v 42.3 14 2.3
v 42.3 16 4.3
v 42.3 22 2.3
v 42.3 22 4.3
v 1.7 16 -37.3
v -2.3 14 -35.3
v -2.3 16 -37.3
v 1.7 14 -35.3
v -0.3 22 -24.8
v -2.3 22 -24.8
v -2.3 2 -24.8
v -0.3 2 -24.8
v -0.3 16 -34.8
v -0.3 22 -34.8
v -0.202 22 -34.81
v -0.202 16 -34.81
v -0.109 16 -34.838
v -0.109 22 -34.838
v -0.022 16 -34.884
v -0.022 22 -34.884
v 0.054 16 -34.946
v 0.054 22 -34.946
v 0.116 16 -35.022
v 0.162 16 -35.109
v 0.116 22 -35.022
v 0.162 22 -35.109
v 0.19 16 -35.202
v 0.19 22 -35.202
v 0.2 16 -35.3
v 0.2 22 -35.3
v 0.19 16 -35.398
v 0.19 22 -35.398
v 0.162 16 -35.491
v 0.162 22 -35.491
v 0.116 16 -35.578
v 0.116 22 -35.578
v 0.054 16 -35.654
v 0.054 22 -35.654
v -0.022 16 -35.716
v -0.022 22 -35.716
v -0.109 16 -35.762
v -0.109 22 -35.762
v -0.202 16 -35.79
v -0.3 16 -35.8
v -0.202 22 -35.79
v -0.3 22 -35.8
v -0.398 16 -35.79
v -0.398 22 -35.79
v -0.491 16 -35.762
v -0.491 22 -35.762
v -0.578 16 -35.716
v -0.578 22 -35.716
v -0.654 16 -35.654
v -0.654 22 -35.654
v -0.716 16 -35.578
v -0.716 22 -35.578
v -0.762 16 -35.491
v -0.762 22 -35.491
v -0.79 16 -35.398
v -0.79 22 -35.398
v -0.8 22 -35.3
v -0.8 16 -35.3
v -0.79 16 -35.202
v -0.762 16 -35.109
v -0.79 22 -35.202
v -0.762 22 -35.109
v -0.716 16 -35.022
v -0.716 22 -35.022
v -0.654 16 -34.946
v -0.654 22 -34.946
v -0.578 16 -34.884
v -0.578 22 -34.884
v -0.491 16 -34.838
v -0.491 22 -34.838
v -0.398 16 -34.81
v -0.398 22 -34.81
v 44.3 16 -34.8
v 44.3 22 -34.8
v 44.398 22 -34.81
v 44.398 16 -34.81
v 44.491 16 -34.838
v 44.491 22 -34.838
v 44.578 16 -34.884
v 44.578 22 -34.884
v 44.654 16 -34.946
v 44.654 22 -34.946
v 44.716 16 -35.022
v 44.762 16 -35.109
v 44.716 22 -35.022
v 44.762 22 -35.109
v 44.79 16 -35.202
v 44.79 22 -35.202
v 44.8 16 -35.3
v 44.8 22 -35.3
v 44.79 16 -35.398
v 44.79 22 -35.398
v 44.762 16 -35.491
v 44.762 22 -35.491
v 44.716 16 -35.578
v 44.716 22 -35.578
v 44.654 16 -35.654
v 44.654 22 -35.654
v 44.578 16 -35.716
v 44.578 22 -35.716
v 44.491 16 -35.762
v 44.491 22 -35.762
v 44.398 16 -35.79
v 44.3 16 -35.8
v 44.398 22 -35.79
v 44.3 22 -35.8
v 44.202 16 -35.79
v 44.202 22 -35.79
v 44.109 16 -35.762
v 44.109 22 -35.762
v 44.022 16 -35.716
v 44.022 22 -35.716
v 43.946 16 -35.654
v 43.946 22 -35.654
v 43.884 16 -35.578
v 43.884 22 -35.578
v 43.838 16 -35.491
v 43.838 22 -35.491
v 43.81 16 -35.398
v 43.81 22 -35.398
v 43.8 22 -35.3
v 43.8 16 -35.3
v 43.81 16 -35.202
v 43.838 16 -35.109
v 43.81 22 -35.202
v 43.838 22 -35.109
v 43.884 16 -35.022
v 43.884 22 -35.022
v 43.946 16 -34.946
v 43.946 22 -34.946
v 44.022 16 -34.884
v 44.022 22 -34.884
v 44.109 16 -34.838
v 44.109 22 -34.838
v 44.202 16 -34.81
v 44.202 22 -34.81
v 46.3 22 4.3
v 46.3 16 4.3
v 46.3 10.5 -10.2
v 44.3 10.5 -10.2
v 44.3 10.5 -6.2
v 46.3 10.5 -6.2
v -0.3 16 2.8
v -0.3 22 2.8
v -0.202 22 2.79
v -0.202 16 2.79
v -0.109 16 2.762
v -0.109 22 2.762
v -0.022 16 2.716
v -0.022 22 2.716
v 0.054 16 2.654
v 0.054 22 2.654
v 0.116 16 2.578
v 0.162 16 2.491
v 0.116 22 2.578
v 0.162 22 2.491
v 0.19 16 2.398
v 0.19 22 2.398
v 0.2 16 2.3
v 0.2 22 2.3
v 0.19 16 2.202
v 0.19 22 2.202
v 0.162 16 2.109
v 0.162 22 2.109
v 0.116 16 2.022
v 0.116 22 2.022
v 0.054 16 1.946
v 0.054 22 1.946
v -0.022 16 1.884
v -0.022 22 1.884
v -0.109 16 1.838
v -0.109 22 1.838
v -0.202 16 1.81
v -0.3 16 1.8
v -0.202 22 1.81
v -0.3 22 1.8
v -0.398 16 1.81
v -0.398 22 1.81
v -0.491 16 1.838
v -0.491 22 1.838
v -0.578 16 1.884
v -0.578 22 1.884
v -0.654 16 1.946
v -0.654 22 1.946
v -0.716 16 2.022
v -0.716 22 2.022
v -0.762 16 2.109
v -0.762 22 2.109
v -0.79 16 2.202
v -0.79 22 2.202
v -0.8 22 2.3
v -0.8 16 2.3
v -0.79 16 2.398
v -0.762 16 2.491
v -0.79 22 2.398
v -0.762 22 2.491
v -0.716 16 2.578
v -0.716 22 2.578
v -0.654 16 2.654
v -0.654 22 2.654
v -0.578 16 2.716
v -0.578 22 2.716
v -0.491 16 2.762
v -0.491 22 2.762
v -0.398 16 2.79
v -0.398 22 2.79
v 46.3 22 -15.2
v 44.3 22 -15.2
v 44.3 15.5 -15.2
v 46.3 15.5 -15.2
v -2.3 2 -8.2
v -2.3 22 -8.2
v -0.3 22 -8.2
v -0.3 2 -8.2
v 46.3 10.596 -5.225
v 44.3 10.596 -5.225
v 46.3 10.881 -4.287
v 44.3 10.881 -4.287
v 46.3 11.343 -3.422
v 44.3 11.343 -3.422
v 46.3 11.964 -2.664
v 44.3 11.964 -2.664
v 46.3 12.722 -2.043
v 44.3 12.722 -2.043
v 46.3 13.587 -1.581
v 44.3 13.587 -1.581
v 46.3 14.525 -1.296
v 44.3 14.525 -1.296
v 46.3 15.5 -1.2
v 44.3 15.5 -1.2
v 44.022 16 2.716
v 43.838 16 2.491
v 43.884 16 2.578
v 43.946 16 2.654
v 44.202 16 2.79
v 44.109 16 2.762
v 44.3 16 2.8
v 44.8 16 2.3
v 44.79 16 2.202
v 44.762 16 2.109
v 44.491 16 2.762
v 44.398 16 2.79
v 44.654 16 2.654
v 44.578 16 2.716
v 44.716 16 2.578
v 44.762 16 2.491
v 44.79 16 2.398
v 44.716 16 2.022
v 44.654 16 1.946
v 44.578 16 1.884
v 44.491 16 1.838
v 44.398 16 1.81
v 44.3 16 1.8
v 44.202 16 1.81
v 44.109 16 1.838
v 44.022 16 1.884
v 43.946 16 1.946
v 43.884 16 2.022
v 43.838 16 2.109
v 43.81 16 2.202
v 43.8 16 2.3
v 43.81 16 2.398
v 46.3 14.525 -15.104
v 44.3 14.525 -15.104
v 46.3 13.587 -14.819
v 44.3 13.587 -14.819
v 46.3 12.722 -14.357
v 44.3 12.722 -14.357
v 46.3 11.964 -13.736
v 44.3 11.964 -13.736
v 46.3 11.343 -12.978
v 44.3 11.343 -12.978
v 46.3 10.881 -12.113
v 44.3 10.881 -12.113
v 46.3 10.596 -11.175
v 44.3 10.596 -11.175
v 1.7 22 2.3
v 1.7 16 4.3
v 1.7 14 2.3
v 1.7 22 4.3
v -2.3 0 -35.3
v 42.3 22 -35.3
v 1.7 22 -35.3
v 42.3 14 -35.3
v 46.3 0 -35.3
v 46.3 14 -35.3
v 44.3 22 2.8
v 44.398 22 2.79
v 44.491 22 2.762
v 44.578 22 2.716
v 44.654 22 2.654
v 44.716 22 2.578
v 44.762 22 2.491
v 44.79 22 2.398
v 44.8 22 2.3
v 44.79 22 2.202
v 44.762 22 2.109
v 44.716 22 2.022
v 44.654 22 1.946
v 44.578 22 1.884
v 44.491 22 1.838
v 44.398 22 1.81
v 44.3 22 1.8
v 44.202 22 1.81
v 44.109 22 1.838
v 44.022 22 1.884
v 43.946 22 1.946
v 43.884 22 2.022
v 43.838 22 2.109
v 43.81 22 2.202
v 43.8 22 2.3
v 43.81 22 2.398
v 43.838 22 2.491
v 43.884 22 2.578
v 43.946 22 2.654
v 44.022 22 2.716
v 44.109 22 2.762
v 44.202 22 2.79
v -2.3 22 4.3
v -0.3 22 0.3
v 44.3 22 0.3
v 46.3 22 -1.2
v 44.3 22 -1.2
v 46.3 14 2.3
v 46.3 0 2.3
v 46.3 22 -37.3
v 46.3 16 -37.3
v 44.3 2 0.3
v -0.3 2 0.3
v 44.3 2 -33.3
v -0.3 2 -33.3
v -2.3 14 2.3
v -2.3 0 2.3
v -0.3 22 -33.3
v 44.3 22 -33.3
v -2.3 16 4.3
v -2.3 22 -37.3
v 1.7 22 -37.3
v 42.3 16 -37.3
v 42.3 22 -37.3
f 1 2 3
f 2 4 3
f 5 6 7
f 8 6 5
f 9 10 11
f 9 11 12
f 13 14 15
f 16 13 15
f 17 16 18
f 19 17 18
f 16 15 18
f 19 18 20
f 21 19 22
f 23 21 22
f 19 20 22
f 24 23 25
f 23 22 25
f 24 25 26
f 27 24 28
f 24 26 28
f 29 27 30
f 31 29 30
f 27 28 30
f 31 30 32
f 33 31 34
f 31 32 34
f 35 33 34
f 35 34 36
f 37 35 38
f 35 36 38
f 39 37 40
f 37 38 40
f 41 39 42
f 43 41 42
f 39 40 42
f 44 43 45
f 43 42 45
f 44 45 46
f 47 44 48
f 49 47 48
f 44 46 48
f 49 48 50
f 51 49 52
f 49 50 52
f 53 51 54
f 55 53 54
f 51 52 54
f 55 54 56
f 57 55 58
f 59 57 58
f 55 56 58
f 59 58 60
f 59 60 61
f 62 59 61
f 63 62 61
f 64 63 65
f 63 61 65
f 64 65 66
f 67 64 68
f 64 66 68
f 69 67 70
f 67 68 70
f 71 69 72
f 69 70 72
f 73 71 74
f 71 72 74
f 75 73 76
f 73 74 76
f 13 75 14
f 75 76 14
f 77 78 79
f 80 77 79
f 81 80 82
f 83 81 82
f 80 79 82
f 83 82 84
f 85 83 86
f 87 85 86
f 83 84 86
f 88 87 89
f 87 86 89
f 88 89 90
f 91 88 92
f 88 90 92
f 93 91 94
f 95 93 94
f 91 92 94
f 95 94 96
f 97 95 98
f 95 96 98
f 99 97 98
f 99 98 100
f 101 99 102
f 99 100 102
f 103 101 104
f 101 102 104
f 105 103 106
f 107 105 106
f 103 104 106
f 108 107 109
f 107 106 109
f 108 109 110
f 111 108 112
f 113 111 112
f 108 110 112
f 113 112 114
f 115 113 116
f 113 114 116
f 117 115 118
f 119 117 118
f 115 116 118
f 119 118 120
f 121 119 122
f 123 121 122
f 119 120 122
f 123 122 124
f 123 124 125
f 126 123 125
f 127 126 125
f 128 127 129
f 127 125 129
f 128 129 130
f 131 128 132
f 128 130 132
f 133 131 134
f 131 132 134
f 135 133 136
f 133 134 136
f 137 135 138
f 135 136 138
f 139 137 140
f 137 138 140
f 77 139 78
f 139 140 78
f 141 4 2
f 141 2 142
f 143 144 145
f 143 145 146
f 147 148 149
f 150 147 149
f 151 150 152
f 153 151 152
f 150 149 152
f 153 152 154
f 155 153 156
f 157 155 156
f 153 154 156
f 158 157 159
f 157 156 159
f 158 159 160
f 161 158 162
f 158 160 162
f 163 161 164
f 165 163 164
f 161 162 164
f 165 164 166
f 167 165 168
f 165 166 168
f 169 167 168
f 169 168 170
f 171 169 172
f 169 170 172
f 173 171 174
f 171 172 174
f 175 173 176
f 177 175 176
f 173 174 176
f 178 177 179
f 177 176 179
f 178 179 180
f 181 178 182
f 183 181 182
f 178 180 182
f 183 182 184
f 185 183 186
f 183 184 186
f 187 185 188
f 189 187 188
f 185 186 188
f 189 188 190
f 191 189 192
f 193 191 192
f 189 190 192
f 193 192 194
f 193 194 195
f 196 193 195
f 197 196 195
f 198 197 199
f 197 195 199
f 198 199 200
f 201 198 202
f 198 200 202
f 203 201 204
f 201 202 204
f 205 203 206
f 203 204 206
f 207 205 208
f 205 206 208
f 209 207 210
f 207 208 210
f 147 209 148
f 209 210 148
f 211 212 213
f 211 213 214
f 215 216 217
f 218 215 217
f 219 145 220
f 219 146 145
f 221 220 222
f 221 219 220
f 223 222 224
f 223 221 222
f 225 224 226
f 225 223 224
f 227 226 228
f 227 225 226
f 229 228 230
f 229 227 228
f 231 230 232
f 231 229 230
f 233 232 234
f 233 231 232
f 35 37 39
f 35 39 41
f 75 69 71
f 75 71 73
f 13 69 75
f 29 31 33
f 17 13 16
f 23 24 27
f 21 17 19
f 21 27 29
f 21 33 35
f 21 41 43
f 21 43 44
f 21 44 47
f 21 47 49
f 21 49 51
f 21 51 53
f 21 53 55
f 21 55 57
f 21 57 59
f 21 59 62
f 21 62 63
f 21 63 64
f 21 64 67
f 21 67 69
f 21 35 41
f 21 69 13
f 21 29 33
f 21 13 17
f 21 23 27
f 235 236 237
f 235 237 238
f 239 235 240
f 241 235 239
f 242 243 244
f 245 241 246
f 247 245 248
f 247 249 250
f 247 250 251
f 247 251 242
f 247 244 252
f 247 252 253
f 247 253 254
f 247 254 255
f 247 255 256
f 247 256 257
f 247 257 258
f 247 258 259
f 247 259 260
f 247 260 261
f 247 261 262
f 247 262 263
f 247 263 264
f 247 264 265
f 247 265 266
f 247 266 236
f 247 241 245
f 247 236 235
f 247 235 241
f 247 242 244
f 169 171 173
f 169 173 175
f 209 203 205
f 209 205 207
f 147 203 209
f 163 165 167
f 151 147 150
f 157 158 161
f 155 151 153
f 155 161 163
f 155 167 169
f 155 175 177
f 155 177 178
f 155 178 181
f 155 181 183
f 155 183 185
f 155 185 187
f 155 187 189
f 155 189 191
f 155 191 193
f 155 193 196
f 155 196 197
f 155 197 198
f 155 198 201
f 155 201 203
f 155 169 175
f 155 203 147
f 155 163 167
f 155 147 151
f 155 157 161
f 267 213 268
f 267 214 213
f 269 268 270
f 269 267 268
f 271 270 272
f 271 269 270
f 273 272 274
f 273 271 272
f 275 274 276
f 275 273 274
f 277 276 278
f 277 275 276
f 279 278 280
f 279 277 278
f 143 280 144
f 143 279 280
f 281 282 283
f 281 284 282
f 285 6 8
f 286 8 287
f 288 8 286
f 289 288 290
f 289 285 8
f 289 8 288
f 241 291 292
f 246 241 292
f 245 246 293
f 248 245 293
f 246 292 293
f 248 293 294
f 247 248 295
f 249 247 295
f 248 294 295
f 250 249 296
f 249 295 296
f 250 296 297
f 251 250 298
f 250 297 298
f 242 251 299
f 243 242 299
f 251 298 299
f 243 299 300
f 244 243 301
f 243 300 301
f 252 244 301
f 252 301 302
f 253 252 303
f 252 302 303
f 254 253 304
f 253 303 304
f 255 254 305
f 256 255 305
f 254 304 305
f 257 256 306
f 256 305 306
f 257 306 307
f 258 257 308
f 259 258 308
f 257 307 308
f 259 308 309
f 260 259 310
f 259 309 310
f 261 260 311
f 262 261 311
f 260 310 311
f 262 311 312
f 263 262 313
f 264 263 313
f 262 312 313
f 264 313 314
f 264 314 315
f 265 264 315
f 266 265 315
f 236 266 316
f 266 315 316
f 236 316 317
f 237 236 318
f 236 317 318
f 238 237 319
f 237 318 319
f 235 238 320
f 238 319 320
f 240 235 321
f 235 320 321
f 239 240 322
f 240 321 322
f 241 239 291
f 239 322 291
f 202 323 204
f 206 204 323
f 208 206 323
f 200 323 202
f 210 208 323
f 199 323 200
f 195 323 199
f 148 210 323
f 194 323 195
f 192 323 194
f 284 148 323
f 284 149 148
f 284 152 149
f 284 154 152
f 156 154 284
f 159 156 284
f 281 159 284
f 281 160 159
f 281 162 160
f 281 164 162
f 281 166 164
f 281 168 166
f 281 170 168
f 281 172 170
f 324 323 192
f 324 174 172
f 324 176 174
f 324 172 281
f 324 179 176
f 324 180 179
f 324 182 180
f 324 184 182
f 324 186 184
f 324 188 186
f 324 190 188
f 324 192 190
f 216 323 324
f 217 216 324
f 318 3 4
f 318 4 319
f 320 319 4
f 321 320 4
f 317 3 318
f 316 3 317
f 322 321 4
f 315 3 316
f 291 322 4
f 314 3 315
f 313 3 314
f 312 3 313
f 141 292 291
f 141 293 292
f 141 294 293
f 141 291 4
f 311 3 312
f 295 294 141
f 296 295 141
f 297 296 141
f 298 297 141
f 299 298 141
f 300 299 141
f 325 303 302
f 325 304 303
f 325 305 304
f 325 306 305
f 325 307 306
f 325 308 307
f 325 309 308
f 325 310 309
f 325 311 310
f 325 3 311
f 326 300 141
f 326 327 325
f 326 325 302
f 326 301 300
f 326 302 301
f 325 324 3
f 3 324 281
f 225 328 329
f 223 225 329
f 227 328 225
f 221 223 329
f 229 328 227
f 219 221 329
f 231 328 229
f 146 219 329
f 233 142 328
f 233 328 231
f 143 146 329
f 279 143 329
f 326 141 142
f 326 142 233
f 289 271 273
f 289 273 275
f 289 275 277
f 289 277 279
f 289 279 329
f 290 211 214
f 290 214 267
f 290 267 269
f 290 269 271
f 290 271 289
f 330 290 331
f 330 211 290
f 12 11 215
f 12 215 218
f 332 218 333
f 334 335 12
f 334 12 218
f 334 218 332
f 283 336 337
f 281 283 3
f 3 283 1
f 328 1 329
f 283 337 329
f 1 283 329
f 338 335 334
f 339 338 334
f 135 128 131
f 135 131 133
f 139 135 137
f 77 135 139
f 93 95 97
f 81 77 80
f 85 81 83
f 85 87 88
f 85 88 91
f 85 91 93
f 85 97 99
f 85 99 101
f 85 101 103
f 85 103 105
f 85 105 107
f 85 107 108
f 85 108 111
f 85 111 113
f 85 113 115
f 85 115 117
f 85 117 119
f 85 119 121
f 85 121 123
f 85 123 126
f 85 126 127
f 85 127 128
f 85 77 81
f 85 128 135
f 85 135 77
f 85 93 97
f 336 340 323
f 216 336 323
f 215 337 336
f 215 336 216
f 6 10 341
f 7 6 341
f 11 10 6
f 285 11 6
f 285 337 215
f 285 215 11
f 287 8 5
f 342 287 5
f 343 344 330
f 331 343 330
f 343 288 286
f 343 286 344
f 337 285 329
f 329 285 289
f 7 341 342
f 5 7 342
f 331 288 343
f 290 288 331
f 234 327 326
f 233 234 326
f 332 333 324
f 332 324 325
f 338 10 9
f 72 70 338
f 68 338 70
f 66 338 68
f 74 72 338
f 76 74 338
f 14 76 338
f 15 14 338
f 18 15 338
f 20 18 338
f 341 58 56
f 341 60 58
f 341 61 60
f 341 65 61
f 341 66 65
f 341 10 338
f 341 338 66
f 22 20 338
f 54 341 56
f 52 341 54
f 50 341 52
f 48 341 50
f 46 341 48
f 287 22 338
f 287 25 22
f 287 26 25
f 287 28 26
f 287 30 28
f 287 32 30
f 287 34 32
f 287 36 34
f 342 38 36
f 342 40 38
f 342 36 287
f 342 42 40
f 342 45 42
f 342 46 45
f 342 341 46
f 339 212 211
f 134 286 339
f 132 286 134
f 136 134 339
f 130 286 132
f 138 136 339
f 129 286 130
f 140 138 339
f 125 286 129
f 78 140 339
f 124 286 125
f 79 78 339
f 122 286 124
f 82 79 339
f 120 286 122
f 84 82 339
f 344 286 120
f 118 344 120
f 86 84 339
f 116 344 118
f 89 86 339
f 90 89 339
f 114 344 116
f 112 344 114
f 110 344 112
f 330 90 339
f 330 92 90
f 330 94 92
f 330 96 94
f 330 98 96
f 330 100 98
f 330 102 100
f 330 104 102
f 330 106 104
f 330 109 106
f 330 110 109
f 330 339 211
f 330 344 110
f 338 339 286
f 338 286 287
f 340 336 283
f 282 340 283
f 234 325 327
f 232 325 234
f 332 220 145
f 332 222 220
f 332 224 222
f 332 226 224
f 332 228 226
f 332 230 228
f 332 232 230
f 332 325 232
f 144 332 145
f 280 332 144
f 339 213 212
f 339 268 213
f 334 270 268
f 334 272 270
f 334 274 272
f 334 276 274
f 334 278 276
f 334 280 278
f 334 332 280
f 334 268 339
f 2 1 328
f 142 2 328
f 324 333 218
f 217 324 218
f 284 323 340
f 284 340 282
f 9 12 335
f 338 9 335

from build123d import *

# Parameters (mm, degrees)
SKETCH1_W           = 48.6
SKETCH1_H           = 37.6
SKETCH1_W_2         = 44.6
SKETCH1_H_2         = 33.6
SKETCH1_W_3         = 44
SKETCH1_H_3         = 33
BOSS_EXTRUDE1_DEPTH = 2
SKETCH1_3_W         = 48.6
SKETCH1_3_H         = 37.6
SKETCH1_3_W_2       = 44.6
SKETCH1_3_H_2       = 33.6
BOSS_EXTRUDE2_DEPTH = 22
SKETCH2_W           = 2
SKETCH2_H           = 16.6
CUT_EXTRUDE1_DEPTH  = 20
SKETCH3_W           = 2
SKETCH3_H           = 14
CUT_EXTRUDE2_DEPTH  = 11.5
FILLET1_R           = 5
SKETCH4_W           = 4
SKETCH4_H           = 2
BOSS_EXTRUDE3_DEPTH = 6
CHAMFER1_SIZE       = 2
SKETCH5_R           = 0.5
CUT_EXTRUDE4_DEPTH  = 6


with BuildPart() as part:
    # Sketch1 → Boss-Extrude1 (new body)
    # profile 1 of 3: a face of its own
    with BuildSketch(Plane(origin=(0, 0, 0), x_dir=(1, 0, 0), z_dir=(0, 1, 0))):
        with Locations((22, 16.5)):
            Rectangle(SKETCH1_W, SKETCH1_H)
        with Locations((22, 16.5)):
            Rectangle(SKETCH1_W_2, SKETCH1_H_2, mode=Mode.SUBTRACT)
    # profile 2 of 3: a face of its own
    with BuildSketch(Plane(origin=(0, 0, 0), x_dir=(1, 0, 0), z_dir=(0, 1, 0))):
        with Locations((22, 16.5)):
            Rectangle(SKETCH1_W_2, SKETCH1_H_2)
        with Locations((22, 16.5)):
            Rectangle(SKETCH1_W_3, SKETCH1_H_3, mode=Mode.SUBTRACT)
    # profile 3 of 3: a face of its own
    with BuildSketch(Plane(origin=(0, 0, 0), x_dir=(1, 0, 0), z_dir=(0, 1, 0))):
        with Locations((22, 16.5)):
            Rectangle(SKETCH1_W_3, SKETCH1_H_3)
    extrude(amount=BOSS_EXTRUDE1_DEPTH)

    # Sketch1<3> → Boss-Extrude2 (add)
    with BuildSketch(Plane(origin=(0, 0, 0), x_dir=(1, 0, 0), z_dir=(0, 1, 0))):
        with Locations((22, 16.5)):
            Rectangle(SKETCH1_3_W, SKETCH1_3_H)
        with Locations((22, 16.5)):
            Rectangle(SKETCH1_3_W_2, SKETCH1_3_H_2, mode=Mode.SUBTRACT)
    extrude(amount=BOSS_EXTRUDE2_DEPTH)

    # Sketch2 → Cut-Extrude1 (cut)
    with BuildSketch(Plane(origin=(0, 22, 0), x_dir=(1, 0, 0), z_dir=(0, 1, 0))):
        with Locations((-1.3, 16.5)):
            Rectangle(SKETCH2_W, SKETCH2_H)
    extrude(amount=-CUT_EXTRUDE1_DEPTH, mode=Mode.SUBTRACT)

    # Sketch3 → Cut-Extrude2 (cut)
    with BuildSketch(Plane(origin=(0, 22, 0), x_dir=(1, 0, 0), z_dir=(0, 1, 0))):
        with Locations((45.3, 8.2)):
            Rectangle(SKETCH3_W, SKETCH3_H)
    extrude(amount=-CUT_EXTRUDE2_DEPTH, mode=Mode.SUBTRACT)

    # Fillet1
    fillet1_edges = [part.edges().sort_by_distance(p)[0] for p in [
        (45.3, 10.5, -15.2),
        (45.3, 10.5, -1.2),
    ]]
    fillet(fillet1_edges, radius=FILLET1_R)

    # Sketch4 → Boss-Extrude3 (add)
    with BuildSketch(Plane(origin=(0, 22, 0), x_dir=(1, 0, 0), z_dir=(0, 1, 0))):
        with Locations((44.3, -3.3)):
            Rectangle(SKETCH4_W, SKETCH4_H)
        with Locations((-0.3, -3.3)):
            Rectangle(SKETCH4_W, SKETCH4_H)
        with Locations((-0.3, 36.3)):
            Rectangle(SKETCH4_W, SKETCH4_H)
        with Locations((44.3, 36.3)):
            Rectangle(SKETCH4_W, SKETCH4_H)
    extrude(amount=-BOSS_EXTRUDE3_DEPTH)

    # Chamfer1
    chamfer1_edges = [part.edges().sort_by_distance(p)[0] for p in [
        (-0.3, 16, 2.3),
        (44.3, 16, 2.3),
        (-0.3, 16, -35.3),
        (44.3, 16, -35.3),
    ]]
    chamfer(chamfer1_edges, length=CHAMFER1_SIZE - 0.0001)  # a hair under: the kernel refuses the full size

    # Sketch5 → Cut-Extrude4 (cut)
    with BuildSketch(Plane(origin=(0, 22, 0), x_dir=(1, 0, 0), z_dir=(0, 1, 0))):
        with Locations(Location((44.3, -2.3, 0), (0, 0, 270))):
            Circle(SKETCH5_R)
        with Locations(Location((-0.3, -2.3, 0), (0, 0, 270))):
            Circle(SKETCH5_R)
        with Locations(Location((-0.3, 35.3, 0), (0, 0, 270))):
            Circle(SKETCH5_R)
        with Locations(Location((44.3, 35.3, 0), (0, 0, 270))):
            Circle(SKETCH5_R)
    extrude(amount=-CUT_EXTRUDE4_DEPTH, mode=Mode.SUBTRACT)


solid = part.part
